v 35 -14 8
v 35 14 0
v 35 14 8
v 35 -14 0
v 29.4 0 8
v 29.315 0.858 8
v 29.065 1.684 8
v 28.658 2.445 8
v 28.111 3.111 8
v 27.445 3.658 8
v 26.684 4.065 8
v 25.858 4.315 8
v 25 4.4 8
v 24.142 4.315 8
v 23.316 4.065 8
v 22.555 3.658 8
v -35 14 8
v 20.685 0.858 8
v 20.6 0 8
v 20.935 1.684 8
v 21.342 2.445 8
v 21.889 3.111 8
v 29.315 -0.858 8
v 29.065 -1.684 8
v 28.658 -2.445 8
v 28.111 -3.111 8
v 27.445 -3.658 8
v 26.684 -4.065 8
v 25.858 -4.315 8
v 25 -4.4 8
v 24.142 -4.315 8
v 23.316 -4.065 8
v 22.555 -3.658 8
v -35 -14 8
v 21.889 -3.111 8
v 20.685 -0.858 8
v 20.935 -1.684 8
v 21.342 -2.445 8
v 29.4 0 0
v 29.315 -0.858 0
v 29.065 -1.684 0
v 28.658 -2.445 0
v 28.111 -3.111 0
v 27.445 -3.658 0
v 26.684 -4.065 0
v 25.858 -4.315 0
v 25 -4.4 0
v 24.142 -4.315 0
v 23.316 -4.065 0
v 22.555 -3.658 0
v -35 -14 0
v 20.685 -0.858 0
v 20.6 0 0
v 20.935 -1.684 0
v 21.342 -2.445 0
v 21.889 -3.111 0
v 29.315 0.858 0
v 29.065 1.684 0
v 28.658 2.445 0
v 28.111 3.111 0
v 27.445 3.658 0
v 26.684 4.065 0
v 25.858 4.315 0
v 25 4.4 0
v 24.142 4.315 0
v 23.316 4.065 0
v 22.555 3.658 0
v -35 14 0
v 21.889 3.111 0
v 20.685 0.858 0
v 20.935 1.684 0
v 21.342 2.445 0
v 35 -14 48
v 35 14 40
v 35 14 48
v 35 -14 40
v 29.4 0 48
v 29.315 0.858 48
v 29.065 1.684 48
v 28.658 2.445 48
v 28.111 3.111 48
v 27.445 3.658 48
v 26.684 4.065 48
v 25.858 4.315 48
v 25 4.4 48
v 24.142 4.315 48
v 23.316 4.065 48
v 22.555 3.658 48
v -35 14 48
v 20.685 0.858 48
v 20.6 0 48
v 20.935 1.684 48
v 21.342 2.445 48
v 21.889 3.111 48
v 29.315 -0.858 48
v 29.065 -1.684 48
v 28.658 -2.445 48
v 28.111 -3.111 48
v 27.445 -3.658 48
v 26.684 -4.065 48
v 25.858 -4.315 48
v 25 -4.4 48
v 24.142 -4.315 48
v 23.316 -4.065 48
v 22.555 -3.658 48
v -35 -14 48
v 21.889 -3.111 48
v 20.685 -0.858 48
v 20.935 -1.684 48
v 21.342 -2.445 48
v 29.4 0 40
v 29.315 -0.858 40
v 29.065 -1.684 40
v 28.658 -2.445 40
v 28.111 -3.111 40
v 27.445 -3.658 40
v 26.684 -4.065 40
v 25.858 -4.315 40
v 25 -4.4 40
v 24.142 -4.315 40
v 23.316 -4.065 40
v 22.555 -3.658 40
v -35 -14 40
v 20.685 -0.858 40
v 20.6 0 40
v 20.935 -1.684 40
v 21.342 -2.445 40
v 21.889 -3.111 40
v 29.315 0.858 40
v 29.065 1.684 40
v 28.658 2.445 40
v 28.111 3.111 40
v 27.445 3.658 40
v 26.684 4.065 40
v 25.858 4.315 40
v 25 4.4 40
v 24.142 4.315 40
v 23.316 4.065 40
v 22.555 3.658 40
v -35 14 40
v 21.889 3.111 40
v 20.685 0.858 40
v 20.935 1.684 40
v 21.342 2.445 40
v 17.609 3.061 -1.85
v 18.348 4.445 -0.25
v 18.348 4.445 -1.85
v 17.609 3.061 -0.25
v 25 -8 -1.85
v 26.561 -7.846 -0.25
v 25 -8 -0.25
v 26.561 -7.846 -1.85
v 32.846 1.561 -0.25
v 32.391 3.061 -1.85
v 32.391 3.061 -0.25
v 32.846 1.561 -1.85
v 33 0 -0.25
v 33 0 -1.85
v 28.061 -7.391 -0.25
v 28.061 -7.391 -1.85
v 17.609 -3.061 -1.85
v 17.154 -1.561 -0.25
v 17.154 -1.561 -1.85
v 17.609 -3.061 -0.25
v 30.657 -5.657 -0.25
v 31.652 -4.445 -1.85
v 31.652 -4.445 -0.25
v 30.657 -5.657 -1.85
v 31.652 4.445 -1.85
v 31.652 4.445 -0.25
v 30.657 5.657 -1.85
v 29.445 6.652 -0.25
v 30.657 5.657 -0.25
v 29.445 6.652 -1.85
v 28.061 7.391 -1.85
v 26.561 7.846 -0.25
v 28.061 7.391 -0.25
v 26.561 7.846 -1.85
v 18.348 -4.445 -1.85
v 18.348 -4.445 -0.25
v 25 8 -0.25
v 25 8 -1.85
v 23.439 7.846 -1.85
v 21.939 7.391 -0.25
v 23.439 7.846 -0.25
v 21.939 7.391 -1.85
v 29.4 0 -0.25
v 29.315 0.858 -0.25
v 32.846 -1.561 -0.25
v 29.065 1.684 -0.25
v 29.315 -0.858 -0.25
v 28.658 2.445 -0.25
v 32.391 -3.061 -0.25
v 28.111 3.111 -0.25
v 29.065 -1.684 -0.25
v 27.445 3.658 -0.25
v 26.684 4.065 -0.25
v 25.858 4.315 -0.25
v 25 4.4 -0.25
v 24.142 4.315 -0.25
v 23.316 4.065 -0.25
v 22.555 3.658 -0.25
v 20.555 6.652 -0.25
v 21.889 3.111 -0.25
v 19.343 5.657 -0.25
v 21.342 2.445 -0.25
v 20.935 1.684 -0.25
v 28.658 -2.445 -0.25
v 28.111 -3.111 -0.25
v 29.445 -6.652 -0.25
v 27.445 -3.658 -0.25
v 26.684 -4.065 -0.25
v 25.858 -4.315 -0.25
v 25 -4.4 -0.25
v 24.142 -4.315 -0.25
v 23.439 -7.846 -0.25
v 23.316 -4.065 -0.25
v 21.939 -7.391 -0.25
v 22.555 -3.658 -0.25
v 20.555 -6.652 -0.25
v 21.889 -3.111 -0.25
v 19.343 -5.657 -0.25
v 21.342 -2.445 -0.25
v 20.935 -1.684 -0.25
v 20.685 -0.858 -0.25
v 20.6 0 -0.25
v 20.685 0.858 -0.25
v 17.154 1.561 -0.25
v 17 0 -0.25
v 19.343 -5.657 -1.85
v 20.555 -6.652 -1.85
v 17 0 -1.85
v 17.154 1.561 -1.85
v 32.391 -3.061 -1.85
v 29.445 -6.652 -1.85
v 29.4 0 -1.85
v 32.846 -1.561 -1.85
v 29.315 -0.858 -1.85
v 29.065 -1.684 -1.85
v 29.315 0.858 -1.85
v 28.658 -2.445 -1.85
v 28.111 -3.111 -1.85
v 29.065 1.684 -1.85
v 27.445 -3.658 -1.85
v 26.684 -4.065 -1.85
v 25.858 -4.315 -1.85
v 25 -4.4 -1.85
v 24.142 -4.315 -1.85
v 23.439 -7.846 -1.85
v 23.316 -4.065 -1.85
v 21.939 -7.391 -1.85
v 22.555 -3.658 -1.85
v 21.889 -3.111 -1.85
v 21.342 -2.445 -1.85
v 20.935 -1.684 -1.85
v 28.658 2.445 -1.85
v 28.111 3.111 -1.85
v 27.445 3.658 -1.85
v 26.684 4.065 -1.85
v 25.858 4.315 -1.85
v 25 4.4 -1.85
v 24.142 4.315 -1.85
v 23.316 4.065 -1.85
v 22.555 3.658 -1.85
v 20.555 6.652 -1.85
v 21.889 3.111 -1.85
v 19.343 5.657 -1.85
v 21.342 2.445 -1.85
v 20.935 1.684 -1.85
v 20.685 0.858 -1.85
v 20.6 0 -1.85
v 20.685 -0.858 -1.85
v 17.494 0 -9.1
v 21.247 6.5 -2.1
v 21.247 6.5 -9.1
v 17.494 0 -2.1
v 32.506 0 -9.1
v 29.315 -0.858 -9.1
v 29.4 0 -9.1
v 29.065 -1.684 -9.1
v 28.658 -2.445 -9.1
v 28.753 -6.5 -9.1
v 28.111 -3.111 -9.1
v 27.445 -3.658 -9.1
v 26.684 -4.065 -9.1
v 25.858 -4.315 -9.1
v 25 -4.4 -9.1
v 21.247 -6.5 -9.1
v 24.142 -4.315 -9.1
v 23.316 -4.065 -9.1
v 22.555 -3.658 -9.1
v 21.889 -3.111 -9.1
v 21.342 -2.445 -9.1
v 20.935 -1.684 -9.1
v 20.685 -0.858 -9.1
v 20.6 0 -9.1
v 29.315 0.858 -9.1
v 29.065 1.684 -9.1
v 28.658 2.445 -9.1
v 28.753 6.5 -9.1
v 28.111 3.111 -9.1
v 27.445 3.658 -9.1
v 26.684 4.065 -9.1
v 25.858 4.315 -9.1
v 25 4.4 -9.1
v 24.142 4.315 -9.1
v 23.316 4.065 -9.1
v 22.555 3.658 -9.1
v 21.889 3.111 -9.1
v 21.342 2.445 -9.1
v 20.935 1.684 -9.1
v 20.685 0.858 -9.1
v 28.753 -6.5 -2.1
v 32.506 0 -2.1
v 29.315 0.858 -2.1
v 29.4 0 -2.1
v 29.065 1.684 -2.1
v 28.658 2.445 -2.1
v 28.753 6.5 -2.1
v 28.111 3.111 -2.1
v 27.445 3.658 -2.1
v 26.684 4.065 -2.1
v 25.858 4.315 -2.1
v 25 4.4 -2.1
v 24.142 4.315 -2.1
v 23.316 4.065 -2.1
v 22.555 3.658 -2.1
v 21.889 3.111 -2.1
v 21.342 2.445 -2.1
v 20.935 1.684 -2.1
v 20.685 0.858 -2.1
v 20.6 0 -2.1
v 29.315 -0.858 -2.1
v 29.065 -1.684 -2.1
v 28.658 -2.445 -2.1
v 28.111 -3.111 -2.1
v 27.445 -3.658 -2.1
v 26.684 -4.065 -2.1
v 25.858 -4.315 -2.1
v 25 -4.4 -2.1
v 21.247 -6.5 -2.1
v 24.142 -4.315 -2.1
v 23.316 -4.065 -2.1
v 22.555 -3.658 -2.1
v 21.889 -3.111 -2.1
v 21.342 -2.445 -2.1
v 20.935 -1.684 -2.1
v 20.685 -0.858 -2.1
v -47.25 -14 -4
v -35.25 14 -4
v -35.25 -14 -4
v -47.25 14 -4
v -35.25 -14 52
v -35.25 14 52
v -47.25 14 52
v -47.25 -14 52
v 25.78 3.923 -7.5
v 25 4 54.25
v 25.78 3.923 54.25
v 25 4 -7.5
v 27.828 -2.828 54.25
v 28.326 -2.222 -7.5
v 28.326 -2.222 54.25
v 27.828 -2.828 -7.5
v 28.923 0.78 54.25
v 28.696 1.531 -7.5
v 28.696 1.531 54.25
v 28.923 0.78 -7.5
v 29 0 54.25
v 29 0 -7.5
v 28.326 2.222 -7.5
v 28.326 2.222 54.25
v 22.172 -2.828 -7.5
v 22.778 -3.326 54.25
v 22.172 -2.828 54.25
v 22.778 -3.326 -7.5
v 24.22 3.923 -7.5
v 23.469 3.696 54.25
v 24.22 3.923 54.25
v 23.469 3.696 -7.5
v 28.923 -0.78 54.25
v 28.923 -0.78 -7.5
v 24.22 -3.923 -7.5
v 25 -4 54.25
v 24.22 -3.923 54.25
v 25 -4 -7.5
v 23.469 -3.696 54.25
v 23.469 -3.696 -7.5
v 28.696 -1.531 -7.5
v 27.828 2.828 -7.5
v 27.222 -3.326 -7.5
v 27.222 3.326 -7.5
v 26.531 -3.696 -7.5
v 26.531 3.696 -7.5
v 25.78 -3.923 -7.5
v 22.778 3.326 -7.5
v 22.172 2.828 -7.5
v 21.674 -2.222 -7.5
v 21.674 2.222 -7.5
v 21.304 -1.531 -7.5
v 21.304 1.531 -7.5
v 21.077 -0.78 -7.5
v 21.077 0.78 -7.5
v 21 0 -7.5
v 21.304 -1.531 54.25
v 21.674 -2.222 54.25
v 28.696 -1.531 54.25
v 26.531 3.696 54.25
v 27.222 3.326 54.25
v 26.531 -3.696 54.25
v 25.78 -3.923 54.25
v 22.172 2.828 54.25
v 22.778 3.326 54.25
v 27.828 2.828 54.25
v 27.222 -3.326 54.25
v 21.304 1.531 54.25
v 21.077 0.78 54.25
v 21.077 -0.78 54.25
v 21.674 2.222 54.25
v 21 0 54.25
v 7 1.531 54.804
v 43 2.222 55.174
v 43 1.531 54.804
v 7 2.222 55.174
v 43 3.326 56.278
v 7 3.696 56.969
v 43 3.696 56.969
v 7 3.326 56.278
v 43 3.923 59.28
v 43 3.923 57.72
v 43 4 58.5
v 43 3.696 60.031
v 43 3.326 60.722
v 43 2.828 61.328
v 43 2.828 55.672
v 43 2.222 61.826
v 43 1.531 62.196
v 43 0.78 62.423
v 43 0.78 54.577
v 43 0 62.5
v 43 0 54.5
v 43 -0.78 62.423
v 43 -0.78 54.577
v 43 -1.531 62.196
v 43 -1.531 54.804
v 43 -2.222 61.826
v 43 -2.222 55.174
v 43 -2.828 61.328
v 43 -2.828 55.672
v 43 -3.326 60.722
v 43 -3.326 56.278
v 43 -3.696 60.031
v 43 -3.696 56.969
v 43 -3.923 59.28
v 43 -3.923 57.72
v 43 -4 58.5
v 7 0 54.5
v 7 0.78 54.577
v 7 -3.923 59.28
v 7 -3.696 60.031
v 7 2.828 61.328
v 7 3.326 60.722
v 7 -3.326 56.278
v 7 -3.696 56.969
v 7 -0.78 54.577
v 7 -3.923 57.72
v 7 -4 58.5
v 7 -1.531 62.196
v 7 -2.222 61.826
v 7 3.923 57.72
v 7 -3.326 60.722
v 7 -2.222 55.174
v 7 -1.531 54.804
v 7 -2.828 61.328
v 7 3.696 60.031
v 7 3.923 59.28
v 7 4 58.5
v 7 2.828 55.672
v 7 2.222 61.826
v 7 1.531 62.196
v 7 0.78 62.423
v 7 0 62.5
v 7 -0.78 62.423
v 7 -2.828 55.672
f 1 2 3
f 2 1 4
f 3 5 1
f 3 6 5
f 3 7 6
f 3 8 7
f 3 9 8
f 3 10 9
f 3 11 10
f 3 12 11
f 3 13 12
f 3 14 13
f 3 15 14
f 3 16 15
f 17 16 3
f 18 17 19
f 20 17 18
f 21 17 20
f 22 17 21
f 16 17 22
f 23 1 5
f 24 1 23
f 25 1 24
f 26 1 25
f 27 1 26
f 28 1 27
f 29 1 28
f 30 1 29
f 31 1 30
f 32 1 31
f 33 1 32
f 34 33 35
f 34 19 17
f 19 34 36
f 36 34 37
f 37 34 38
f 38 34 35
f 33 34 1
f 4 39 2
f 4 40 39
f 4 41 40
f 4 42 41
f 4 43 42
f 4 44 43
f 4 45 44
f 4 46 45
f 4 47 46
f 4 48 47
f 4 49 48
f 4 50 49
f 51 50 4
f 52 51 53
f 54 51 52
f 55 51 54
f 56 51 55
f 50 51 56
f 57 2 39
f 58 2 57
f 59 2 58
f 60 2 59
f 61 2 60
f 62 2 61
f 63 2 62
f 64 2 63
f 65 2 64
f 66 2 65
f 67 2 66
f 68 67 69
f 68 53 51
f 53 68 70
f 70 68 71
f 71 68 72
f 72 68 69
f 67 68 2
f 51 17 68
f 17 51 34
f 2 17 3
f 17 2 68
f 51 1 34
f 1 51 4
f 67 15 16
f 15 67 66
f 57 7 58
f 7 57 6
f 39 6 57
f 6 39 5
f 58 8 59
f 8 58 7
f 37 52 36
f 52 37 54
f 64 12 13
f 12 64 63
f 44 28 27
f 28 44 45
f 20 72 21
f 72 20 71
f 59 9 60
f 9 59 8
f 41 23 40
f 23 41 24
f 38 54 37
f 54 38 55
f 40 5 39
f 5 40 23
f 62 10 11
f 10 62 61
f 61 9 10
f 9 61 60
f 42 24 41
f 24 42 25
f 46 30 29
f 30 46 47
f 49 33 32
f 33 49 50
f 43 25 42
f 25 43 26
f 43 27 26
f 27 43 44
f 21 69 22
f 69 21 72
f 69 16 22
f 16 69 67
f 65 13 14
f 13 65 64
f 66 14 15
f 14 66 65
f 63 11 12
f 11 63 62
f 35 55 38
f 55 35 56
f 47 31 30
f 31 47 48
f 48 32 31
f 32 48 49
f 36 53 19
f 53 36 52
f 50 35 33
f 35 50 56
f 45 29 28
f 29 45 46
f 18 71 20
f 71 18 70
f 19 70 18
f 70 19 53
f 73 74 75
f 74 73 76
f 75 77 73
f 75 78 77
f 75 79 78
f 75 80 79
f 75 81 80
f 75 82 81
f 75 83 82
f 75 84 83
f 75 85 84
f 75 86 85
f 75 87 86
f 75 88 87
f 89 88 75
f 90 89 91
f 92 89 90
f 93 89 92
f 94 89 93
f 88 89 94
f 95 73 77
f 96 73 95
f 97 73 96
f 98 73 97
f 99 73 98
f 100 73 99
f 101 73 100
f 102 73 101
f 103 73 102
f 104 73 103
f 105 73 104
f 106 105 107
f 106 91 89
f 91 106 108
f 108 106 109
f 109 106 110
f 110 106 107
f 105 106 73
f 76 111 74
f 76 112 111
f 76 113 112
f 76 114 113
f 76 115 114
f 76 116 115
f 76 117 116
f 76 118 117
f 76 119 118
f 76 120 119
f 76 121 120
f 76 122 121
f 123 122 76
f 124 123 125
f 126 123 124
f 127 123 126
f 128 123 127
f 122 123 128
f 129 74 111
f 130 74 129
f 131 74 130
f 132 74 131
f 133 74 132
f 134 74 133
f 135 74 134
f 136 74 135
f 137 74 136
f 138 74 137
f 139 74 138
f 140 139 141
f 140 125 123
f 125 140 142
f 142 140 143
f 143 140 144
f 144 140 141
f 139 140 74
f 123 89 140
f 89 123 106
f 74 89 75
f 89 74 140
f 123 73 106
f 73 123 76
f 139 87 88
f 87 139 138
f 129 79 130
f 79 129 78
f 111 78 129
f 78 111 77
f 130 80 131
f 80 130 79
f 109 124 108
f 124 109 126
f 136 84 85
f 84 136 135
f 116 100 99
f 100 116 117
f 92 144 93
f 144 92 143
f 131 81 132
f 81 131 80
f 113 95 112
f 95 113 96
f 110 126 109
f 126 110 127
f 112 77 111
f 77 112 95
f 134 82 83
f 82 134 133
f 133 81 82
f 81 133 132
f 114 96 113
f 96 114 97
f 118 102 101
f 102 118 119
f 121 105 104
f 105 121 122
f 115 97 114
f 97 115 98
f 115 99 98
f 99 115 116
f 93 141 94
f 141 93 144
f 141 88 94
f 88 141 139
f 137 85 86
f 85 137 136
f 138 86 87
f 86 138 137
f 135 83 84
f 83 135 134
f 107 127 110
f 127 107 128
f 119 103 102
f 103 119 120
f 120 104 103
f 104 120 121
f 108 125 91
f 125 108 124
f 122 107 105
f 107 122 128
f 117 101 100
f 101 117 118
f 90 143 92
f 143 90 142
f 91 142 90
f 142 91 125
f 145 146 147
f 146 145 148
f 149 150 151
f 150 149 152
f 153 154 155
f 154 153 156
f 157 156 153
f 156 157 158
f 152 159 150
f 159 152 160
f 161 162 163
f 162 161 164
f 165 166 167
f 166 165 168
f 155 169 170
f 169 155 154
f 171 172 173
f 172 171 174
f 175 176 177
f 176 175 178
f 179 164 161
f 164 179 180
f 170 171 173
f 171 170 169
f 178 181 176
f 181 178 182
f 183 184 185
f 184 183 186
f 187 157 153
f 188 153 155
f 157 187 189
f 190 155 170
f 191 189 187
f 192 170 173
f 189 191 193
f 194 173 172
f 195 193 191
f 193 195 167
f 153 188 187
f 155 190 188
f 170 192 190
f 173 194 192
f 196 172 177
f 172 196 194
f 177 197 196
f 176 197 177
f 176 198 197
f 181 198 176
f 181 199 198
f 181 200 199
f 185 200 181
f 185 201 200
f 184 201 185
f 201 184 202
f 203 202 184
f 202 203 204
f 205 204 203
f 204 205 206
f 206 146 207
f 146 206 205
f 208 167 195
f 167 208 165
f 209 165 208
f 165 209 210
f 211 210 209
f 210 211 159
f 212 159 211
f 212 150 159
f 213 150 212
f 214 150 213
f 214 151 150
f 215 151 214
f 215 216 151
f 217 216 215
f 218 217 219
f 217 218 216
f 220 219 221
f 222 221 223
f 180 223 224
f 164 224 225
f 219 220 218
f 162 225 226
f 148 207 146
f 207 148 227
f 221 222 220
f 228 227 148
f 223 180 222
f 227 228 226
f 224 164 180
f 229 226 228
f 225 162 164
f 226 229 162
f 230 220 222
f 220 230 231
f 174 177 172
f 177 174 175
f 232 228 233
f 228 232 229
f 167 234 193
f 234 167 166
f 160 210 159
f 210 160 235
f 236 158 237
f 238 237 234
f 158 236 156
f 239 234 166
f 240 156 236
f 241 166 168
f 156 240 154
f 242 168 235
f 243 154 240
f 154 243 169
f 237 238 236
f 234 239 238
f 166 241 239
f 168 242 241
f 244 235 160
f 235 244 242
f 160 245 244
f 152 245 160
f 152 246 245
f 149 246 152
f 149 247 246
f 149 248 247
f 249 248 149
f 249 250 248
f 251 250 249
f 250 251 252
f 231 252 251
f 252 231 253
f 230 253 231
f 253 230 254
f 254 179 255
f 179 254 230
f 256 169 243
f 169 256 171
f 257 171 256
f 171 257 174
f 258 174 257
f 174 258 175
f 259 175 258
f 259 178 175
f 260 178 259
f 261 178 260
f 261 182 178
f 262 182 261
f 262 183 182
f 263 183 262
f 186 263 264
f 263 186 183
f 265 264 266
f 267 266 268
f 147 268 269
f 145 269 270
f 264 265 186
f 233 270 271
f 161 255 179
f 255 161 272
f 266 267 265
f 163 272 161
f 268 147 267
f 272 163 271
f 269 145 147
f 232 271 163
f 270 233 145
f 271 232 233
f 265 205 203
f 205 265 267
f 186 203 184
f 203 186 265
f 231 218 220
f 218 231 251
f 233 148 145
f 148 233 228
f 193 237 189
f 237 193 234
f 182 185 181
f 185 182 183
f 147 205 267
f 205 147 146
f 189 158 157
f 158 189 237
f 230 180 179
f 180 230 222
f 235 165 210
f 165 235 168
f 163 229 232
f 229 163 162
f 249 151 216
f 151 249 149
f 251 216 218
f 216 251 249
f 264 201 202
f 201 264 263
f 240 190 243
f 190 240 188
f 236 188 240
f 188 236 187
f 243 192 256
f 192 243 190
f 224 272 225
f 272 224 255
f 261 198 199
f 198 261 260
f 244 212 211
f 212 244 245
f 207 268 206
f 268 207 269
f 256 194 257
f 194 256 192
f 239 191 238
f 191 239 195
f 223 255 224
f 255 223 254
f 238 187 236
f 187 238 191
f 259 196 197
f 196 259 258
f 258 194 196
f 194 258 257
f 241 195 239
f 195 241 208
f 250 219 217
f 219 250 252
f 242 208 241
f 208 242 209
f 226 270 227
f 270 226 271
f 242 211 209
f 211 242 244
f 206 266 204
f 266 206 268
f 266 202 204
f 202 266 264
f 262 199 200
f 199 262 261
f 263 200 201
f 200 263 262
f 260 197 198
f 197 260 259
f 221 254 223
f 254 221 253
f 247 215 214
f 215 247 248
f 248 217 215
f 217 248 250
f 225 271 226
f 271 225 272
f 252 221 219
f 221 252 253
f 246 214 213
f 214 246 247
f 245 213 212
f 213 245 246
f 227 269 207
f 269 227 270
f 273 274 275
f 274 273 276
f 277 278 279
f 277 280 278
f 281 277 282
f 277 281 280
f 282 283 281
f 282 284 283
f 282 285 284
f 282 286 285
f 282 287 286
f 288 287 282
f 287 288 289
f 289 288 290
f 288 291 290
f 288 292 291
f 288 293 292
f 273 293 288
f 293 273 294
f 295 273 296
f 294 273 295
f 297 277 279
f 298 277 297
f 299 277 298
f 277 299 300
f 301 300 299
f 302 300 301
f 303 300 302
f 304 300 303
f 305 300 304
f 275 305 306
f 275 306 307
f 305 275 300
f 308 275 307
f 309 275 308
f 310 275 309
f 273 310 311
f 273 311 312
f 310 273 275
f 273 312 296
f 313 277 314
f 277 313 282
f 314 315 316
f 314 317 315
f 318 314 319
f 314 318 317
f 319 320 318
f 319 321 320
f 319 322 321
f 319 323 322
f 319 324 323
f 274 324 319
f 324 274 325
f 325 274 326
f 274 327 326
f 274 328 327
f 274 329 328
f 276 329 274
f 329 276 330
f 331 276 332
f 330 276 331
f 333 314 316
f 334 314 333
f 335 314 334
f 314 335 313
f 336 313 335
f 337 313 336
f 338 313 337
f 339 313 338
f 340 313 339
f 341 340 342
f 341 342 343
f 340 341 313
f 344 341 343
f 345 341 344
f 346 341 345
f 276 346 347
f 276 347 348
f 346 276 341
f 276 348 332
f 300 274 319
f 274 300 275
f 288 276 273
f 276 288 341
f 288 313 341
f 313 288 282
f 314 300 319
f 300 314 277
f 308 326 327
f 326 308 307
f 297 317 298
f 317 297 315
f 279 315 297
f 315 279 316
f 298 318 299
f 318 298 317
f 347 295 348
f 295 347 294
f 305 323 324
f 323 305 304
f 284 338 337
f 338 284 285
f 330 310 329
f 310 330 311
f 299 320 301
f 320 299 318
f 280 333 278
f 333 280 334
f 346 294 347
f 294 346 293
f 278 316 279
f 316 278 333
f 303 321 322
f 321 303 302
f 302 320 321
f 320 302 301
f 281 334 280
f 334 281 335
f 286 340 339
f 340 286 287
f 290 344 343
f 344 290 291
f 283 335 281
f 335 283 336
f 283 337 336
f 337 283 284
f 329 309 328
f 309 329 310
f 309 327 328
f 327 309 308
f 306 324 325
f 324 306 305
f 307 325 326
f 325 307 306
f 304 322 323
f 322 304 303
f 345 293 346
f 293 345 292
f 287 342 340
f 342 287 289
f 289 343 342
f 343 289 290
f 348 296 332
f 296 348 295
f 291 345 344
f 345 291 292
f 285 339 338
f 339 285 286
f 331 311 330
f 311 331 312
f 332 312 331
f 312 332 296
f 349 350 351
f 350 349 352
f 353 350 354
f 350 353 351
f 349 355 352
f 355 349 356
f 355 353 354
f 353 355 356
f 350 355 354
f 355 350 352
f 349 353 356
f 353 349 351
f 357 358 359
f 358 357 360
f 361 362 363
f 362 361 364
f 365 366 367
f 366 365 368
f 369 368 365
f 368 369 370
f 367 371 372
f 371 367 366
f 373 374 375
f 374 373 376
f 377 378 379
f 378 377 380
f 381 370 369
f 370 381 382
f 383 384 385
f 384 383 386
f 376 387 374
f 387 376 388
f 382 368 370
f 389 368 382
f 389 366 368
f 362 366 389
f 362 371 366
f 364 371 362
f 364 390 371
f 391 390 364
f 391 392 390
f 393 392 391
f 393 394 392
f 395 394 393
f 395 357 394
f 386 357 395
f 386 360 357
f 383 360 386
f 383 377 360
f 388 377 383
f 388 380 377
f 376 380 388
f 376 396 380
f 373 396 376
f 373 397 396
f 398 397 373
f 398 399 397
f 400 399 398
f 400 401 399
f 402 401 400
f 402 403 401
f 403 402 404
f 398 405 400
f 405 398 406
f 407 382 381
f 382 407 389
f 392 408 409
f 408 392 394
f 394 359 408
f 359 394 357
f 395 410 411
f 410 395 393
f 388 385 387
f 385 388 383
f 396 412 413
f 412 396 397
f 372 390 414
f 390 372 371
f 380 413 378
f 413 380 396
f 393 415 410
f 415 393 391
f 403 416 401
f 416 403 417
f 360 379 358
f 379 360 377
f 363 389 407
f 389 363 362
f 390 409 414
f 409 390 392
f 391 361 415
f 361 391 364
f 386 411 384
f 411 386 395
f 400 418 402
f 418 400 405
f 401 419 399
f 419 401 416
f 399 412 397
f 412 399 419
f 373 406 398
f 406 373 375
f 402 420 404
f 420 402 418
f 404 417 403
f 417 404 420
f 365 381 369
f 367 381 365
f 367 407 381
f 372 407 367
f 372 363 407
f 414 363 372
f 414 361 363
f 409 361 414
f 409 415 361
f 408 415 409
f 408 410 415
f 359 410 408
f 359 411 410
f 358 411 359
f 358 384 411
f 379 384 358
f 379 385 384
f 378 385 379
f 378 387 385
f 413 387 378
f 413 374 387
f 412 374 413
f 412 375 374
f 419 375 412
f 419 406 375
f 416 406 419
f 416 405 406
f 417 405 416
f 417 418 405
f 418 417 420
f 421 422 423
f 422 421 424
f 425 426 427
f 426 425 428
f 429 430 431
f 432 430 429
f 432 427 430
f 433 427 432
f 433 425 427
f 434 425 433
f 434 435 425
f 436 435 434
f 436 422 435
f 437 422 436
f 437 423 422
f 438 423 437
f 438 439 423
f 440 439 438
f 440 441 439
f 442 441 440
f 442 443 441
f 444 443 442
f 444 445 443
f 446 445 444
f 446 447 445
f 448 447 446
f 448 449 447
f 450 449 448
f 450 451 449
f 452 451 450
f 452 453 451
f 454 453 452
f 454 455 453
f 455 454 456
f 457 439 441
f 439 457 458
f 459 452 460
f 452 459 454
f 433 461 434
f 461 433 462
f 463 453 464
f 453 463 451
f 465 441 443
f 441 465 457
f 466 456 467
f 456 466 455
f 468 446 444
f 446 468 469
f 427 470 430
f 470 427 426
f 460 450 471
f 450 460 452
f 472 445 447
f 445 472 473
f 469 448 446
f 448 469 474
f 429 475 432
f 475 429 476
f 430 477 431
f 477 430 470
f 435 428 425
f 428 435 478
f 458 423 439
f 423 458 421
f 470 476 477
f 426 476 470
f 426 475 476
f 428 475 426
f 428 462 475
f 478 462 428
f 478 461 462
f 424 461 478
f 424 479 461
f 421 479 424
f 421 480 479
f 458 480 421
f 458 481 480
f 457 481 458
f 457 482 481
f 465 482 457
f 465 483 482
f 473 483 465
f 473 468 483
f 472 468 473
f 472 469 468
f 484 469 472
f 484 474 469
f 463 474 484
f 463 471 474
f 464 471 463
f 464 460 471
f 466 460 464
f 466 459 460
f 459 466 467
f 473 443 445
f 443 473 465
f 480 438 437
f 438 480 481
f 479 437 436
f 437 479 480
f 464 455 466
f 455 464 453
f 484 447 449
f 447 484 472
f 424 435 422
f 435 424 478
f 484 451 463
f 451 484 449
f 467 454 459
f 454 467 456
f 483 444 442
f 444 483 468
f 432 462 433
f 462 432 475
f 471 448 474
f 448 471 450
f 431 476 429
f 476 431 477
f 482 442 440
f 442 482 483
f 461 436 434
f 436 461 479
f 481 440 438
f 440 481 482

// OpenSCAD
$fn = 32;

// ------------------------------------------------------------------------
// C clamp: throat 40 mm, screw d8
// Every part is its own module, assembly() places every instance.
// ------------------------------------------------------------------------

// --- part 1 ---
module clamp_arm() {
  difference() {
    translate([-35, -14, 0]) cube([70, 28, 8]);
    translate([25, 0, -1]) cylinder(h = 10, d = 8.8);
  }
}

// --- part 2 ---
module clamp_spine() {
  difference() {
    translate([-28, -14, 0]) cube([56, 28, 12]);
  }
}

// --- part 3 ---
module clamp_screw() {
  translate([0, 0, -30.875]) cylinder(h = 61.75, d = 8);
}

// --- part 4 ---
module clamp_washer() {
  difference() {
      translate([0, 0, 0]) cylinder(h = 1.6, d = 16);
      translate([0, 0, -1]) cylinder(h = 3.6, d = 8.8);
    }
}

// --- part 5 ---
module clamp_nut() {
  difference() {
    linear_extrude(height = 7) polygon(points = [[7.506, 0], [3.753, 6.5], [-3.753, 6.5], [-7.506, 0], [-3.753, -6.5], [3.753, -6.5]]);
    translate([0, 0, -1]) cylinder(h = 9, d = 8.8);
  }
}

// --- part 6 ---
module tommy_bar() {
  translate([0, 0, -18]) cylinder(h = 36, d = 8);
}

// --- assembly ---
module assembly() {
  color([0.80, 0.24, 0.20]) translate([0, 0, 0]) rotate([0, 0, 0]) clamp_arm();
  color([0.20, 0.45, 0.75]) translate([0, 0, 40]) rotate([0, 0, 0]) clamp_arm();
  color([0.25, 0.62, 0.32]) translate([-47.25, 0, 24]) rotate([0, 90, 0]) clamp_spine();
  color([0.92, 0.70, 0.18]) translate([25, 0, 23.375]) rotate([0, 0, 0]) clamp_screw();
  color([0.58, 0.35, 0.70]) translate([25, 0, -1.85]) rotate([0, 0, 0]) clamp_washer();
  color([0.16, 0.66, 0.66]) translate([25, 0, -9.1]) rotate([0, 0, 0]) clamp_nut();
  color([0.85, 0.48, 0.18]) translate([25, 0, 58.5]) rotate([0, 90, 0]) tommy_bar();
}

assembly();
